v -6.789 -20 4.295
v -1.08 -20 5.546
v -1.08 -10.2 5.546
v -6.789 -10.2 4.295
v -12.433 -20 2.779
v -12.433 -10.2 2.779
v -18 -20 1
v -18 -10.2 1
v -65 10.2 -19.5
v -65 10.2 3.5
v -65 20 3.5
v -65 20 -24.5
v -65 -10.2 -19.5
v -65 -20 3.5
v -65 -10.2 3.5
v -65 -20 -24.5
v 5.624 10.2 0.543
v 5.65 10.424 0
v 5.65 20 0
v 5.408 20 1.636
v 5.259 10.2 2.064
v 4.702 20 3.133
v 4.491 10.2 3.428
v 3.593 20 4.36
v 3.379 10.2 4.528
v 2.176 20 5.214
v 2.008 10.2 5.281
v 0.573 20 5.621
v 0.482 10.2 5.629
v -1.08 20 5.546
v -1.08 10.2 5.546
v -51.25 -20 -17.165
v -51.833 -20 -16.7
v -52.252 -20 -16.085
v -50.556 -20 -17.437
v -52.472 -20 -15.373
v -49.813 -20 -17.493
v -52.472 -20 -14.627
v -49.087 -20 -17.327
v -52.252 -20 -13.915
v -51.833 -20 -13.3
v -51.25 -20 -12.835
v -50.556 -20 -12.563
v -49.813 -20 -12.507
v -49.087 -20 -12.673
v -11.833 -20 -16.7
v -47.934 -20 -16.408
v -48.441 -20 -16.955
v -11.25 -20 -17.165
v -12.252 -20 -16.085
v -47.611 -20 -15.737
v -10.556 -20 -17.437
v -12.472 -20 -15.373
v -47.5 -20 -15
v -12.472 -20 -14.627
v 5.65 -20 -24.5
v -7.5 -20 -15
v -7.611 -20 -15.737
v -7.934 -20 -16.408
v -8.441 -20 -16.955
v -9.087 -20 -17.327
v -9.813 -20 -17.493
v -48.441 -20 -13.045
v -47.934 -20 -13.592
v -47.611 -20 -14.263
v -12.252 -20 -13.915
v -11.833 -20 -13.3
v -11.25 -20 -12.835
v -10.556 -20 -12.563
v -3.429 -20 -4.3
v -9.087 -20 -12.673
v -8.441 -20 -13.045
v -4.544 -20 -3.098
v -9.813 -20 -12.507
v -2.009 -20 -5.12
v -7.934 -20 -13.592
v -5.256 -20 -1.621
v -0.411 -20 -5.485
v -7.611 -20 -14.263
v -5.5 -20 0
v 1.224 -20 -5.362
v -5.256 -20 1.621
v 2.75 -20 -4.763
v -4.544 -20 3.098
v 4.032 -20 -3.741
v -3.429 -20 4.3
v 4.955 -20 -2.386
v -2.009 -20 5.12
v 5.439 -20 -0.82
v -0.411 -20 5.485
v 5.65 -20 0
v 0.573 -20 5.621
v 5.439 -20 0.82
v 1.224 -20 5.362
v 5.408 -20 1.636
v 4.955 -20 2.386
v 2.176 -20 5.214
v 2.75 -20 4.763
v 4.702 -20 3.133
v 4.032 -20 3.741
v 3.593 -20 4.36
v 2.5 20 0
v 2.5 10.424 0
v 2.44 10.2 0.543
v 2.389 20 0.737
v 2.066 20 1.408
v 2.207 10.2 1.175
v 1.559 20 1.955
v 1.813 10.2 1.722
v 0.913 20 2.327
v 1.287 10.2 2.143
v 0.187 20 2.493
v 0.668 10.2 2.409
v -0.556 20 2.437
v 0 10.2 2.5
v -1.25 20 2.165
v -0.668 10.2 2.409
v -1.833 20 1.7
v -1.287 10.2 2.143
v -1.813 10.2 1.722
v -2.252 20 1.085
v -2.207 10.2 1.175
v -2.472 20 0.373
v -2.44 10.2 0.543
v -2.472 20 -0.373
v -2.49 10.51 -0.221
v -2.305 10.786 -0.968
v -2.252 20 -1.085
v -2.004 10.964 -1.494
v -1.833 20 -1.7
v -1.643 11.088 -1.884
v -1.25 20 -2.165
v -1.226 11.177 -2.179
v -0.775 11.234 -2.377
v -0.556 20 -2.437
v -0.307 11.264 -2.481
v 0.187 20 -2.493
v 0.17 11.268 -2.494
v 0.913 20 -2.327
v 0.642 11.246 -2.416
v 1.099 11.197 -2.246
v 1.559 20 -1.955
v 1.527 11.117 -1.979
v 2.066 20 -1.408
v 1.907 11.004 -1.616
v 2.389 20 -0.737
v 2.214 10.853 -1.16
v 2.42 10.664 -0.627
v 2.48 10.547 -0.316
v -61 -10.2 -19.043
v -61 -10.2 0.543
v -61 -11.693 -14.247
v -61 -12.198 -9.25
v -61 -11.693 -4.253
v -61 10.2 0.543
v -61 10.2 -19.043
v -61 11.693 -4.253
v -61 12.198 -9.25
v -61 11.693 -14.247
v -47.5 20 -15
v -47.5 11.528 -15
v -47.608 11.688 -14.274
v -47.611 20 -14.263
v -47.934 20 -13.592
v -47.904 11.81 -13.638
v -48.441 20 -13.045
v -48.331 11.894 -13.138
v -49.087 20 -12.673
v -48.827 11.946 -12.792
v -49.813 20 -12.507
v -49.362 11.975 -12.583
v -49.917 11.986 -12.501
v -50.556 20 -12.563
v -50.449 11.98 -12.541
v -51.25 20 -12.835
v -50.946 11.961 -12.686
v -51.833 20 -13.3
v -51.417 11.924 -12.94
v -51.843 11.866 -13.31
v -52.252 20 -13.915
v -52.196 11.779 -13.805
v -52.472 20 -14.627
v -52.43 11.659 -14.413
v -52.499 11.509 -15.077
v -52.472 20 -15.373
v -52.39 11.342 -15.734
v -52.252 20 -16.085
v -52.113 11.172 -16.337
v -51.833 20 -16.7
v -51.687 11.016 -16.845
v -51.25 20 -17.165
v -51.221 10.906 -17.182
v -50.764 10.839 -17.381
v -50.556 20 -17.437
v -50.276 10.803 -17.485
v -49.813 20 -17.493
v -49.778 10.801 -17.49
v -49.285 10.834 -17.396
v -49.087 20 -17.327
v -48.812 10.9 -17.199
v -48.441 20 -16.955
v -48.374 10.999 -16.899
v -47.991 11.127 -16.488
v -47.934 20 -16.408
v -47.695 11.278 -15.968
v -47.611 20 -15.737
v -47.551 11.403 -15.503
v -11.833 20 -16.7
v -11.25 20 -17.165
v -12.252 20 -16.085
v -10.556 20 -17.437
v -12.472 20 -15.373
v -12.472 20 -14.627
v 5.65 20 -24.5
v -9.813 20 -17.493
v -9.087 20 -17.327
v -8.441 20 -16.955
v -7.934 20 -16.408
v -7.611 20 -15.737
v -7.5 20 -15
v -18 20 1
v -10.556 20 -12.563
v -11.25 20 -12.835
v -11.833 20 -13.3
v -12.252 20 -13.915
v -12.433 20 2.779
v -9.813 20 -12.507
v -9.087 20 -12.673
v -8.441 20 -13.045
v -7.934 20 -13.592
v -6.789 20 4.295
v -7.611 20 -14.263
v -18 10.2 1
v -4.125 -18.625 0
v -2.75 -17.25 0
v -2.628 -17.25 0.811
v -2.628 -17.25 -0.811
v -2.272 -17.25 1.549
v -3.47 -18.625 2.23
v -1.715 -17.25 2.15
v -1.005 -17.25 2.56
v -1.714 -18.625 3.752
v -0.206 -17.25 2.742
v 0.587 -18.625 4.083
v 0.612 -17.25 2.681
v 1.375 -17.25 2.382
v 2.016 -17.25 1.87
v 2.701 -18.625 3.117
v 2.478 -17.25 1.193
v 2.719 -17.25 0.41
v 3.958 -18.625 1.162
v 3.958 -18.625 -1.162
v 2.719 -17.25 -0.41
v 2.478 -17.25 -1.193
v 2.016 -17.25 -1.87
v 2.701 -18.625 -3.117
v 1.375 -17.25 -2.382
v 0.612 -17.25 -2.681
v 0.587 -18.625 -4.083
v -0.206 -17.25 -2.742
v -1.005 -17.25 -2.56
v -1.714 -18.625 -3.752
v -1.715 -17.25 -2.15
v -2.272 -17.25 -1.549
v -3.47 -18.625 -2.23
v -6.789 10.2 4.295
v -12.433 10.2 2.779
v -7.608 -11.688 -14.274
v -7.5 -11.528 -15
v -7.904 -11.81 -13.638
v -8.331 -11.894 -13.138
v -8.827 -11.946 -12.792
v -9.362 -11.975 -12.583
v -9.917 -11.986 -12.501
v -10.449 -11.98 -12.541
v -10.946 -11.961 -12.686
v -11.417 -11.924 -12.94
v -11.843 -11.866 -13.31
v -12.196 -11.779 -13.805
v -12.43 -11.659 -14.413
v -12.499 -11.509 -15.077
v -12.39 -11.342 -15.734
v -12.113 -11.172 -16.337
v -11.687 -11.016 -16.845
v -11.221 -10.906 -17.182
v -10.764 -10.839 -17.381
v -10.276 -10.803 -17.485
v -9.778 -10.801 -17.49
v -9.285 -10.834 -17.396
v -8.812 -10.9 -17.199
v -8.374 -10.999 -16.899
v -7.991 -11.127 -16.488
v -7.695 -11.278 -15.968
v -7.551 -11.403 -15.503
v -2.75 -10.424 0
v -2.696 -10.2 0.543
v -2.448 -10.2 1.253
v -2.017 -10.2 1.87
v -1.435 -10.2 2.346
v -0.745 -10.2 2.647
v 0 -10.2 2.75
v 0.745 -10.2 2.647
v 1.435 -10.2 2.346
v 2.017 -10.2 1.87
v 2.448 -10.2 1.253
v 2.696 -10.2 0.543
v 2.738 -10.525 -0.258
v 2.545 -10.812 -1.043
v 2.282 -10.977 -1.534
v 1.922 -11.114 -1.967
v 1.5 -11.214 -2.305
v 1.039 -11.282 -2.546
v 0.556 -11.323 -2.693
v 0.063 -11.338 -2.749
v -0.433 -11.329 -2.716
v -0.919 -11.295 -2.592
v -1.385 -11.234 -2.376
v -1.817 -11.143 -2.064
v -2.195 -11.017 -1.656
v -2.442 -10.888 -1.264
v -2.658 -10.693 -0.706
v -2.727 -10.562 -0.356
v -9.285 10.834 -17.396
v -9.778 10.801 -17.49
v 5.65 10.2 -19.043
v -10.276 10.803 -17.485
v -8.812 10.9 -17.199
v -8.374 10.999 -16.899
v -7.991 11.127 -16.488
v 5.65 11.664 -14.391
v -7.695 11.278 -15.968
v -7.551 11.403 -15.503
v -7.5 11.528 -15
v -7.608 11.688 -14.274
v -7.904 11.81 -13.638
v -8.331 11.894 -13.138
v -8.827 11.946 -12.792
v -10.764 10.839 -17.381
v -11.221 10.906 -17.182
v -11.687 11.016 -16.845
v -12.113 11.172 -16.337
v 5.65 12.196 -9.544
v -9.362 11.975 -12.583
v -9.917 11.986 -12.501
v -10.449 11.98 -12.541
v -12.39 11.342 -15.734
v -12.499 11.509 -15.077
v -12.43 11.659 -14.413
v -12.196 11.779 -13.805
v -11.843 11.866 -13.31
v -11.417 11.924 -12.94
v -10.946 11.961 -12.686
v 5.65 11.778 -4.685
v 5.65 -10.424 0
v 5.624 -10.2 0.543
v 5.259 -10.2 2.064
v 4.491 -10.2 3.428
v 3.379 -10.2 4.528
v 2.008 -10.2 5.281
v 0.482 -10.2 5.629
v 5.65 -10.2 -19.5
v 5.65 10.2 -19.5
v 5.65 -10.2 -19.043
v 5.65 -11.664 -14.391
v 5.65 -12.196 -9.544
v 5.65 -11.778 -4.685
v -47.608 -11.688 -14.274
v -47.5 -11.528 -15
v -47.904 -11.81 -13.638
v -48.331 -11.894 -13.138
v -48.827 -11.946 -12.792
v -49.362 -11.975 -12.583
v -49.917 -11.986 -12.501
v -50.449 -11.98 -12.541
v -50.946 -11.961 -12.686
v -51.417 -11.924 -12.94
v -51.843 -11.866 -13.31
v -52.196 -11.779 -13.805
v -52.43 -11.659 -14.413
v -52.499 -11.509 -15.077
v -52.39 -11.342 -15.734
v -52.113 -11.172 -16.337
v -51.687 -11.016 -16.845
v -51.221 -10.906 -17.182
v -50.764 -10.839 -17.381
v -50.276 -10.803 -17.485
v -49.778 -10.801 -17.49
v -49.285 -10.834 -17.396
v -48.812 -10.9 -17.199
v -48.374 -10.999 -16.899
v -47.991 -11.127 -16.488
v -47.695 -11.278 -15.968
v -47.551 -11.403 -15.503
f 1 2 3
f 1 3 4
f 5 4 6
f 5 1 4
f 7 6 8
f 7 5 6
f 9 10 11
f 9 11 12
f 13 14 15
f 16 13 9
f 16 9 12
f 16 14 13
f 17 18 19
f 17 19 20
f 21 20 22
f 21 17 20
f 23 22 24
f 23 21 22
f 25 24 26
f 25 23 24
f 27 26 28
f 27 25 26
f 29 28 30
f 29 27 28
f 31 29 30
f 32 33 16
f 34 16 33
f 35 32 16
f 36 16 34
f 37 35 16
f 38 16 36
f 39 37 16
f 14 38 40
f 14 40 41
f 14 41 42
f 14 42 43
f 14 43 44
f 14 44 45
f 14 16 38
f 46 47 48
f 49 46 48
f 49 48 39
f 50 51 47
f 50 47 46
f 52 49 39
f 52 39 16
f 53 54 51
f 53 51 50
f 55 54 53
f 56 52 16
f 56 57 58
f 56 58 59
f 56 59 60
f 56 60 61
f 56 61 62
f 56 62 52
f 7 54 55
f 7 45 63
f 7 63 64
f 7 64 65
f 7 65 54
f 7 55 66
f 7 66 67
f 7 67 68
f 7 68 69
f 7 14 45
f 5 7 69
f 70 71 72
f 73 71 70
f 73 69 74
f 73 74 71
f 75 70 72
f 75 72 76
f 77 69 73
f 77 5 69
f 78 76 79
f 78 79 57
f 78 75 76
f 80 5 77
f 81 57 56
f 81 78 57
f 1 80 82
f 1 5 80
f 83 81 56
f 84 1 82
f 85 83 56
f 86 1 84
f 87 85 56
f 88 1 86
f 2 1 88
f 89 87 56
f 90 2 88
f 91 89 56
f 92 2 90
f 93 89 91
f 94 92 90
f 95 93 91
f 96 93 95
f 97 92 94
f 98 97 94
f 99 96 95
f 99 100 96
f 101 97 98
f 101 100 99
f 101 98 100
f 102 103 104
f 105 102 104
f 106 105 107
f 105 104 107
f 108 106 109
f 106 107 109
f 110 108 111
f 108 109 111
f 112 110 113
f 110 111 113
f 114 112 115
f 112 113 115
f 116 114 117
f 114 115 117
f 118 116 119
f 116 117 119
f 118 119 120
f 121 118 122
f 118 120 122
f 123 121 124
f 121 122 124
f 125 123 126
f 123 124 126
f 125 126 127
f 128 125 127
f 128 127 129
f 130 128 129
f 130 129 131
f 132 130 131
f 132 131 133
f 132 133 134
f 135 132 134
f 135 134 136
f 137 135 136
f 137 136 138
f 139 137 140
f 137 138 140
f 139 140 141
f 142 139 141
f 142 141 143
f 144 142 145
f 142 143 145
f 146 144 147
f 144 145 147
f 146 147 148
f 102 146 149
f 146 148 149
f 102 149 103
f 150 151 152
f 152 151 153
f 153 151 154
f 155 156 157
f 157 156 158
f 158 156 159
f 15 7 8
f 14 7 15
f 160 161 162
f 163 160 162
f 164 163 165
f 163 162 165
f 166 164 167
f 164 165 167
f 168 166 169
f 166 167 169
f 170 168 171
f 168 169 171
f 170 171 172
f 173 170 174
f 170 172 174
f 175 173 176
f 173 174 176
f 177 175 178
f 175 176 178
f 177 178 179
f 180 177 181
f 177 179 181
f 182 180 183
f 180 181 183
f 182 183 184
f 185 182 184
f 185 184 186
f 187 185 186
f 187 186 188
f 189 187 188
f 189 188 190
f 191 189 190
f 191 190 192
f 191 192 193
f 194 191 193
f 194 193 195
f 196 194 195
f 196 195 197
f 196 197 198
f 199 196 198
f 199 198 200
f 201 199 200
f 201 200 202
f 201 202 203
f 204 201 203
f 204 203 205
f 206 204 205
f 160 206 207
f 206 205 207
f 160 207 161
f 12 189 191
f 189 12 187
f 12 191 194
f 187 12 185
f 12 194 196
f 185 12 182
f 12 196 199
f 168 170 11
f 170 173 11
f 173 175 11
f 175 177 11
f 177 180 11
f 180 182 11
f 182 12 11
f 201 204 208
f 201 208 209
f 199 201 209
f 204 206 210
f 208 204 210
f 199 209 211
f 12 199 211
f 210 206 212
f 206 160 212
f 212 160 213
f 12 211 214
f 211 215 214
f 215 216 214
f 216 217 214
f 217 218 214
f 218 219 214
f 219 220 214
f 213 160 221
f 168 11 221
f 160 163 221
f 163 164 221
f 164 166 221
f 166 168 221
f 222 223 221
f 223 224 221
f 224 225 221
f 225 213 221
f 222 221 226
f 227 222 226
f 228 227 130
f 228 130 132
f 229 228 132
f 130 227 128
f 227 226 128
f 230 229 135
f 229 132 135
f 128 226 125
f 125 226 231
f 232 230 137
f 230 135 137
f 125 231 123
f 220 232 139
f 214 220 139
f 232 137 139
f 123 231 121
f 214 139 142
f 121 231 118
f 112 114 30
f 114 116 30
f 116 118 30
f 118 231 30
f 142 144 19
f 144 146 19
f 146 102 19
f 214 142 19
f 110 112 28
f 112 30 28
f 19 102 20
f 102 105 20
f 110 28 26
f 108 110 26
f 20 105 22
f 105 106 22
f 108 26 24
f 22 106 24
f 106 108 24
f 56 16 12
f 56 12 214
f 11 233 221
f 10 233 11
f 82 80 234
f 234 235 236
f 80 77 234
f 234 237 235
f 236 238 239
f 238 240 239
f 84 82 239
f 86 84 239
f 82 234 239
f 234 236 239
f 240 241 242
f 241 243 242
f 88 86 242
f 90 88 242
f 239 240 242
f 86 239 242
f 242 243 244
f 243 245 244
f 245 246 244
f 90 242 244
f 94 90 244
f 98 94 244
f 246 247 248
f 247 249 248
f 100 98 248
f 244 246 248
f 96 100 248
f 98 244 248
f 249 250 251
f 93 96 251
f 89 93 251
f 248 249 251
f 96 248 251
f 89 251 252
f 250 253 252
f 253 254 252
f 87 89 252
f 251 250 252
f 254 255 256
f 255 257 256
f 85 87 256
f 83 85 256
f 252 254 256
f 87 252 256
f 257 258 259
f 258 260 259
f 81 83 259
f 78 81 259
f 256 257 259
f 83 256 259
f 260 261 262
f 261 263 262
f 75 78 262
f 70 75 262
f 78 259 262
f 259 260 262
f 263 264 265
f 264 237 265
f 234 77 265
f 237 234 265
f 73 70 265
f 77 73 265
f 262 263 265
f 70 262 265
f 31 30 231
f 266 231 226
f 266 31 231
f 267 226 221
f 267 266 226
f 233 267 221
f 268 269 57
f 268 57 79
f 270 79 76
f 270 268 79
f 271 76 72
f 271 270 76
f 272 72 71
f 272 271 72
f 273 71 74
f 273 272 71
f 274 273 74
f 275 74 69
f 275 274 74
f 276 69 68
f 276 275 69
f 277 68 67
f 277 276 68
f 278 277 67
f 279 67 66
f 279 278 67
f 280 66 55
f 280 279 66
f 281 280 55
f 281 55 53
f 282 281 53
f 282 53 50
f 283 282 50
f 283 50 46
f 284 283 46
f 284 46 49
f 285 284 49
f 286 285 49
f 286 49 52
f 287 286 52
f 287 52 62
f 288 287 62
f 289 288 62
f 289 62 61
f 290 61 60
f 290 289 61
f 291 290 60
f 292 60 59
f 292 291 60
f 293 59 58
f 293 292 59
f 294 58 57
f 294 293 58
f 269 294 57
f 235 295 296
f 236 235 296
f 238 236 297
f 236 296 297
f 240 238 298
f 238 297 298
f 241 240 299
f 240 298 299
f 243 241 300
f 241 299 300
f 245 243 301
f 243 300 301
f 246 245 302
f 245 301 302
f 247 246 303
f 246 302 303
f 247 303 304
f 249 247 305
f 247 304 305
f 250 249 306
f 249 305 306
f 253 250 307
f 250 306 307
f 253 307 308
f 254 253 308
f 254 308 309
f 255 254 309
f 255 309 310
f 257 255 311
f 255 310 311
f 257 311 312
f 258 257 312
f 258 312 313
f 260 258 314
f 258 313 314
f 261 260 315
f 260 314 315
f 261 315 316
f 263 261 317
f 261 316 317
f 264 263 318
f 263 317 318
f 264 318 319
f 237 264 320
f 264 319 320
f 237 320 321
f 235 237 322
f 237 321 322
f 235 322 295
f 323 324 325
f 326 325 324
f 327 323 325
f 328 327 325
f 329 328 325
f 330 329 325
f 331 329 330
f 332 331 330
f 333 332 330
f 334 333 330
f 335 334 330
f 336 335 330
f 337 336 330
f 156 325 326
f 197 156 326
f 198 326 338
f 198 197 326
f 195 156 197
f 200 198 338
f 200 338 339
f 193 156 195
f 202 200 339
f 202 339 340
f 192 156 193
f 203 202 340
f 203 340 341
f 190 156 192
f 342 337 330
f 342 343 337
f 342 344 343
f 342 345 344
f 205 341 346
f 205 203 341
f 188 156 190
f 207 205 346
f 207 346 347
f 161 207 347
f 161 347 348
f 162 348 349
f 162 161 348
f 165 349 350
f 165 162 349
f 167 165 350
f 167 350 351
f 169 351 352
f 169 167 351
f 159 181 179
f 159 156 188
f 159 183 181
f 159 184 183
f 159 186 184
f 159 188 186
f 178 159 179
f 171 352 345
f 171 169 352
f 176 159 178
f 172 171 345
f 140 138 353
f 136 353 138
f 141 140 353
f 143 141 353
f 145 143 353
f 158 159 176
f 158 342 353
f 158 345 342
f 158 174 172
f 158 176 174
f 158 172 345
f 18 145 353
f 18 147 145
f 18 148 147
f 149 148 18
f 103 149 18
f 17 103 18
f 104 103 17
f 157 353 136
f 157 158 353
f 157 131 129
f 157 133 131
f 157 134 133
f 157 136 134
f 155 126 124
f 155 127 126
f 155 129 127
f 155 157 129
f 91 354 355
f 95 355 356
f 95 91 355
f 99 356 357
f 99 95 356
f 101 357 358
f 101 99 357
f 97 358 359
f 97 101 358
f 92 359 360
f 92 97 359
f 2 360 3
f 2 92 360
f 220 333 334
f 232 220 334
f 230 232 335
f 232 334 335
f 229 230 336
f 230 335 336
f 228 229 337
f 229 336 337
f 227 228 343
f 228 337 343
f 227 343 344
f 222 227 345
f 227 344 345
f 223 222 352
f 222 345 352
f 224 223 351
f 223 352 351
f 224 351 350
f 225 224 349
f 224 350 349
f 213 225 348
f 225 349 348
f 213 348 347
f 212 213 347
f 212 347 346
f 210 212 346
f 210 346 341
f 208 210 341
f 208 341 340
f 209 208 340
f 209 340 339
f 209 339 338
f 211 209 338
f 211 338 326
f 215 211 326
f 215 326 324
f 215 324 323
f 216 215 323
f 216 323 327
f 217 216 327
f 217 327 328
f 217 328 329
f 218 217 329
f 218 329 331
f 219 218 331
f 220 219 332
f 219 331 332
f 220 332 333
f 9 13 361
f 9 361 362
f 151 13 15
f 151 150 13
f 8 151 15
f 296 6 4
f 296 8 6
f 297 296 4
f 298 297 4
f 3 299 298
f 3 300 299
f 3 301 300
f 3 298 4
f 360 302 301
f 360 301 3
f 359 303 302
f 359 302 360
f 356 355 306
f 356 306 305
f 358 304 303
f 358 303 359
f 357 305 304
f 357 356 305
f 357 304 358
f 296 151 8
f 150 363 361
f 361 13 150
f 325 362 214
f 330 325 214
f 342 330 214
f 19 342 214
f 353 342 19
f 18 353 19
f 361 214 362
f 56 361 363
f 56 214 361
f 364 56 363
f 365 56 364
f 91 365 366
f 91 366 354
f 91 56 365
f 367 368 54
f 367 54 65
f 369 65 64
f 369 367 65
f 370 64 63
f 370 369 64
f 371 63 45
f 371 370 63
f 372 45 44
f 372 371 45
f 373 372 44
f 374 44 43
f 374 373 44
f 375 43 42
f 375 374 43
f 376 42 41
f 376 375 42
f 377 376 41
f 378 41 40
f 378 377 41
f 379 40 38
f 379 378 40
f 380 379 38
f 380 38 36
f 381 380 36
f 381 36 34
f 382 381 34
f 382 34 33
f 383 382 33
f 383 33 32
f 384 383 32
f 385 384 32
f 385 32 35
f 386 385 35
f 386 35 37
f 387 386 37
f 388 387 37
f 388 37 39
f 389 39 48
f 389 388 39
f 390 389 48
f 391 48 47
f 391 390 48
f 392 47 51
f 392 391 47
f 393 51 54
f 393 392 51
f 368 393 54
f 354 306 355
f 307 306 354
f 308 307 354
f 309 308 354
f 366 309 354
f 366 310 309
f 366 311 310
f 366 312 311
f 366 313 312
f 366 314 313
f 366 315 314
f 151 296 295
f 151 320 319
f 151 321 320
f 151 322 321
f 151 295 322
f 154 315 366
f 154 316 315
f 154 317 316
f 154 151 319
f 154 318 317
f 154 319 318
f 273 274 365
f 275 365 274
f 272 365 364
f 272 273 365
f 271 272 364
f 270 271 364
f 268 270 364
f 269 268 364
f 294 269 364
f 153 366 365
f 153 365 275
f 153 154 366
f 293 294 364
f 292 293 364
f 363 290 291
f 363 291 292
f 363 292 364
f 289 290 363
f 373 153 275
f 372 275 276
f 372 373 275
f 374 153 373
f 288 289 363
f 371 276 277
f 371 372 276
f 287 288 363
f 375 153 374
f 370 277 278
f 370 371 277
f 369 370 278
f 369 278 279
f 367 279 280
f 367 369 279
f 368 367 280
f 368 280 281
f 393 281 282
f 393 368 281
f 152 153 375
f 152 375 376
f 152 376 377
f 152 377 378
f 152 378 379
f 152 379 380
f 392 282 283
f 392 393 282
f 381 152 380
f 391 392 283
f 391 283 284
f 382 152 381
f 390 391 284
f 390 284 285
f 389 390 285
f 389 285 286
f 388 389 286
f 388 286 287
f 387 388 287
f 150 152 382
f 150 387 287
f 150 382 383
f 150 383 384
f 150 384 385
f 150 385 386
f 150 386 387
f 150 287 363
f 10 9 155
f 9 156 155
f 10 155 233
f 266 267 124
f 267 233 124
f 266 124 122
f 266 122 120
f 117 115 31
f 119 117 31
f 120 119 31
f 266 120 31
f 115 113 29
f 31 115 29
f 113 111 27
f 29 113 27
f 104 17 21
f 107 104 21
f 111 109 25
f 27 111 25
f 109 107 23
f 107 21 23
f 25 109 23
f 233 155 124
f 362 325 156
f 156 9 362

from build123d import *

# Parameters (mm, degrees)
PAD040_DEPTH         = 20
SKETCH138_W          = 20.4
SKETCH138_H          = 70
POCKET051_DEPTH      = 65.001
POCKET051_DEPTH_BACK = 5.651
SKETCH135_R          = 2.5
POCKET049_DEPTH      = 40.001
HOLE028_D            = 5.5
HOLE028_DEPTH        = 20
HOLE028_CSINK_D      = 11
HOLE028_CSINK_ANGLE  = 90
HOLE028_TIPS_R       = 2.75
POCKET050_DEPTH      = 66.651
SKETCH140_R          = 2.5
POCKET054_DEPTH      = 20.001
POCKET054_DEPTH_BACK = 20.001


with BuildPart() as part:
    # Sketch134 → Pad040 (new body, symmetric)
    with BuildSketch(Plane.XZ):
        with BuildLine():
            Line((-18, 1), (-65, 3.5))
            Line((-65, 3.5), (-65, -24.5))
            Line((-65, -24.5), (5.65, -24.5))
            Line((5.65, -24.5), (5.65, 0))
            ThreePointArc((5.65, 0), (3.593093, 4.360296), (-1.079976, 5.545823))
            ThreePointArc((-1.079976, 5.545823), (-9.619729, 3.569716), (-18, 1))
        make_face()
    extrude(amount=PAD040_DEPTH, both=True)

    # Sketch138 → Pocket051 (cut, two sides)
    with BuildSketch(Plane.YZ) as pocket051_sk:
        with Locations((0, 15.5)):
            Rectangle(SKETCH138_W, SKETCH138_H)
    extrude(amount=-POCKET051_DEPTH, mode=Mode.SUBTRACT)
    extrude(pocket051_sk.sketch, amount=POCKET051_DEPTH_BACK, mode=Mode.SUBTRACT)

    # Sketch135 → Pocket049 (cut, through all)
    with BuildSketch(Plane.XZ.offset(20)):
        Circle(SKETCH135_R)
    extrude(amount=-POCKET049_DEPTH, mode=Mode.SUBTRACT)

    # Hole028
    with Locations(Plane.XZ.offset(20)):
        with Locations((0, 0)):
            CounterSinkHole(HOLE028_D / 2, HOLE028_CSINK_D / 2, depth=HOLE028_DEPTH, counter_sink_angle=HOLE028_CSINK_ANGLE)

    # Hole028 tips → Hole028 tip 1 section 0
    with BuildSketch(Plane.XZ, mode=Mode.PRIVATE) as hole028_tip_1_s0:
        Circle(HOLE028_TIPS_R)
    loft([hole028_tip_1_s0.sketch, Vertex(0, 1.652367, 0)], mode=Mode.SUBTRACT)

    # Sketch137 → Pocket050 (cut, through all)
    with BuildSketch(Plane.YZ.offset(-61)):
        with BuildLine():
            ThreePointArc((-10, 1), (-12.197862, -9.25), (-10, -19.5))
            Line((10, -19.5), (-10, -19.5))
            ThreePointArc((10, -19.5), (12.197862, -9.25), (10, 1))
            Line((-10, 1), (10, 1))
        make_face()
    extrude(amount=POCKET050_DEPTH, mode=Mode.SUBTRACT)

    # Sketch140 → Pocket054 (cut, two sides)
    with BuildSketch(Plane.XZ) as pocket054_sk:
        with Locations((-10, -15)):
            Circle(SKETCH140_R)
        with Locations((-50, -15)):
            Circle(SKETCH140_R)
    extrude(amount=-POCKET054_DEPTH, mode=Mode.SUBTRACT)
    extrude(pocket054_sk.sketch, amount=POCKET054_DEPTH_BACK, mode=Mode.SUBTRACT)


solid = part.part
